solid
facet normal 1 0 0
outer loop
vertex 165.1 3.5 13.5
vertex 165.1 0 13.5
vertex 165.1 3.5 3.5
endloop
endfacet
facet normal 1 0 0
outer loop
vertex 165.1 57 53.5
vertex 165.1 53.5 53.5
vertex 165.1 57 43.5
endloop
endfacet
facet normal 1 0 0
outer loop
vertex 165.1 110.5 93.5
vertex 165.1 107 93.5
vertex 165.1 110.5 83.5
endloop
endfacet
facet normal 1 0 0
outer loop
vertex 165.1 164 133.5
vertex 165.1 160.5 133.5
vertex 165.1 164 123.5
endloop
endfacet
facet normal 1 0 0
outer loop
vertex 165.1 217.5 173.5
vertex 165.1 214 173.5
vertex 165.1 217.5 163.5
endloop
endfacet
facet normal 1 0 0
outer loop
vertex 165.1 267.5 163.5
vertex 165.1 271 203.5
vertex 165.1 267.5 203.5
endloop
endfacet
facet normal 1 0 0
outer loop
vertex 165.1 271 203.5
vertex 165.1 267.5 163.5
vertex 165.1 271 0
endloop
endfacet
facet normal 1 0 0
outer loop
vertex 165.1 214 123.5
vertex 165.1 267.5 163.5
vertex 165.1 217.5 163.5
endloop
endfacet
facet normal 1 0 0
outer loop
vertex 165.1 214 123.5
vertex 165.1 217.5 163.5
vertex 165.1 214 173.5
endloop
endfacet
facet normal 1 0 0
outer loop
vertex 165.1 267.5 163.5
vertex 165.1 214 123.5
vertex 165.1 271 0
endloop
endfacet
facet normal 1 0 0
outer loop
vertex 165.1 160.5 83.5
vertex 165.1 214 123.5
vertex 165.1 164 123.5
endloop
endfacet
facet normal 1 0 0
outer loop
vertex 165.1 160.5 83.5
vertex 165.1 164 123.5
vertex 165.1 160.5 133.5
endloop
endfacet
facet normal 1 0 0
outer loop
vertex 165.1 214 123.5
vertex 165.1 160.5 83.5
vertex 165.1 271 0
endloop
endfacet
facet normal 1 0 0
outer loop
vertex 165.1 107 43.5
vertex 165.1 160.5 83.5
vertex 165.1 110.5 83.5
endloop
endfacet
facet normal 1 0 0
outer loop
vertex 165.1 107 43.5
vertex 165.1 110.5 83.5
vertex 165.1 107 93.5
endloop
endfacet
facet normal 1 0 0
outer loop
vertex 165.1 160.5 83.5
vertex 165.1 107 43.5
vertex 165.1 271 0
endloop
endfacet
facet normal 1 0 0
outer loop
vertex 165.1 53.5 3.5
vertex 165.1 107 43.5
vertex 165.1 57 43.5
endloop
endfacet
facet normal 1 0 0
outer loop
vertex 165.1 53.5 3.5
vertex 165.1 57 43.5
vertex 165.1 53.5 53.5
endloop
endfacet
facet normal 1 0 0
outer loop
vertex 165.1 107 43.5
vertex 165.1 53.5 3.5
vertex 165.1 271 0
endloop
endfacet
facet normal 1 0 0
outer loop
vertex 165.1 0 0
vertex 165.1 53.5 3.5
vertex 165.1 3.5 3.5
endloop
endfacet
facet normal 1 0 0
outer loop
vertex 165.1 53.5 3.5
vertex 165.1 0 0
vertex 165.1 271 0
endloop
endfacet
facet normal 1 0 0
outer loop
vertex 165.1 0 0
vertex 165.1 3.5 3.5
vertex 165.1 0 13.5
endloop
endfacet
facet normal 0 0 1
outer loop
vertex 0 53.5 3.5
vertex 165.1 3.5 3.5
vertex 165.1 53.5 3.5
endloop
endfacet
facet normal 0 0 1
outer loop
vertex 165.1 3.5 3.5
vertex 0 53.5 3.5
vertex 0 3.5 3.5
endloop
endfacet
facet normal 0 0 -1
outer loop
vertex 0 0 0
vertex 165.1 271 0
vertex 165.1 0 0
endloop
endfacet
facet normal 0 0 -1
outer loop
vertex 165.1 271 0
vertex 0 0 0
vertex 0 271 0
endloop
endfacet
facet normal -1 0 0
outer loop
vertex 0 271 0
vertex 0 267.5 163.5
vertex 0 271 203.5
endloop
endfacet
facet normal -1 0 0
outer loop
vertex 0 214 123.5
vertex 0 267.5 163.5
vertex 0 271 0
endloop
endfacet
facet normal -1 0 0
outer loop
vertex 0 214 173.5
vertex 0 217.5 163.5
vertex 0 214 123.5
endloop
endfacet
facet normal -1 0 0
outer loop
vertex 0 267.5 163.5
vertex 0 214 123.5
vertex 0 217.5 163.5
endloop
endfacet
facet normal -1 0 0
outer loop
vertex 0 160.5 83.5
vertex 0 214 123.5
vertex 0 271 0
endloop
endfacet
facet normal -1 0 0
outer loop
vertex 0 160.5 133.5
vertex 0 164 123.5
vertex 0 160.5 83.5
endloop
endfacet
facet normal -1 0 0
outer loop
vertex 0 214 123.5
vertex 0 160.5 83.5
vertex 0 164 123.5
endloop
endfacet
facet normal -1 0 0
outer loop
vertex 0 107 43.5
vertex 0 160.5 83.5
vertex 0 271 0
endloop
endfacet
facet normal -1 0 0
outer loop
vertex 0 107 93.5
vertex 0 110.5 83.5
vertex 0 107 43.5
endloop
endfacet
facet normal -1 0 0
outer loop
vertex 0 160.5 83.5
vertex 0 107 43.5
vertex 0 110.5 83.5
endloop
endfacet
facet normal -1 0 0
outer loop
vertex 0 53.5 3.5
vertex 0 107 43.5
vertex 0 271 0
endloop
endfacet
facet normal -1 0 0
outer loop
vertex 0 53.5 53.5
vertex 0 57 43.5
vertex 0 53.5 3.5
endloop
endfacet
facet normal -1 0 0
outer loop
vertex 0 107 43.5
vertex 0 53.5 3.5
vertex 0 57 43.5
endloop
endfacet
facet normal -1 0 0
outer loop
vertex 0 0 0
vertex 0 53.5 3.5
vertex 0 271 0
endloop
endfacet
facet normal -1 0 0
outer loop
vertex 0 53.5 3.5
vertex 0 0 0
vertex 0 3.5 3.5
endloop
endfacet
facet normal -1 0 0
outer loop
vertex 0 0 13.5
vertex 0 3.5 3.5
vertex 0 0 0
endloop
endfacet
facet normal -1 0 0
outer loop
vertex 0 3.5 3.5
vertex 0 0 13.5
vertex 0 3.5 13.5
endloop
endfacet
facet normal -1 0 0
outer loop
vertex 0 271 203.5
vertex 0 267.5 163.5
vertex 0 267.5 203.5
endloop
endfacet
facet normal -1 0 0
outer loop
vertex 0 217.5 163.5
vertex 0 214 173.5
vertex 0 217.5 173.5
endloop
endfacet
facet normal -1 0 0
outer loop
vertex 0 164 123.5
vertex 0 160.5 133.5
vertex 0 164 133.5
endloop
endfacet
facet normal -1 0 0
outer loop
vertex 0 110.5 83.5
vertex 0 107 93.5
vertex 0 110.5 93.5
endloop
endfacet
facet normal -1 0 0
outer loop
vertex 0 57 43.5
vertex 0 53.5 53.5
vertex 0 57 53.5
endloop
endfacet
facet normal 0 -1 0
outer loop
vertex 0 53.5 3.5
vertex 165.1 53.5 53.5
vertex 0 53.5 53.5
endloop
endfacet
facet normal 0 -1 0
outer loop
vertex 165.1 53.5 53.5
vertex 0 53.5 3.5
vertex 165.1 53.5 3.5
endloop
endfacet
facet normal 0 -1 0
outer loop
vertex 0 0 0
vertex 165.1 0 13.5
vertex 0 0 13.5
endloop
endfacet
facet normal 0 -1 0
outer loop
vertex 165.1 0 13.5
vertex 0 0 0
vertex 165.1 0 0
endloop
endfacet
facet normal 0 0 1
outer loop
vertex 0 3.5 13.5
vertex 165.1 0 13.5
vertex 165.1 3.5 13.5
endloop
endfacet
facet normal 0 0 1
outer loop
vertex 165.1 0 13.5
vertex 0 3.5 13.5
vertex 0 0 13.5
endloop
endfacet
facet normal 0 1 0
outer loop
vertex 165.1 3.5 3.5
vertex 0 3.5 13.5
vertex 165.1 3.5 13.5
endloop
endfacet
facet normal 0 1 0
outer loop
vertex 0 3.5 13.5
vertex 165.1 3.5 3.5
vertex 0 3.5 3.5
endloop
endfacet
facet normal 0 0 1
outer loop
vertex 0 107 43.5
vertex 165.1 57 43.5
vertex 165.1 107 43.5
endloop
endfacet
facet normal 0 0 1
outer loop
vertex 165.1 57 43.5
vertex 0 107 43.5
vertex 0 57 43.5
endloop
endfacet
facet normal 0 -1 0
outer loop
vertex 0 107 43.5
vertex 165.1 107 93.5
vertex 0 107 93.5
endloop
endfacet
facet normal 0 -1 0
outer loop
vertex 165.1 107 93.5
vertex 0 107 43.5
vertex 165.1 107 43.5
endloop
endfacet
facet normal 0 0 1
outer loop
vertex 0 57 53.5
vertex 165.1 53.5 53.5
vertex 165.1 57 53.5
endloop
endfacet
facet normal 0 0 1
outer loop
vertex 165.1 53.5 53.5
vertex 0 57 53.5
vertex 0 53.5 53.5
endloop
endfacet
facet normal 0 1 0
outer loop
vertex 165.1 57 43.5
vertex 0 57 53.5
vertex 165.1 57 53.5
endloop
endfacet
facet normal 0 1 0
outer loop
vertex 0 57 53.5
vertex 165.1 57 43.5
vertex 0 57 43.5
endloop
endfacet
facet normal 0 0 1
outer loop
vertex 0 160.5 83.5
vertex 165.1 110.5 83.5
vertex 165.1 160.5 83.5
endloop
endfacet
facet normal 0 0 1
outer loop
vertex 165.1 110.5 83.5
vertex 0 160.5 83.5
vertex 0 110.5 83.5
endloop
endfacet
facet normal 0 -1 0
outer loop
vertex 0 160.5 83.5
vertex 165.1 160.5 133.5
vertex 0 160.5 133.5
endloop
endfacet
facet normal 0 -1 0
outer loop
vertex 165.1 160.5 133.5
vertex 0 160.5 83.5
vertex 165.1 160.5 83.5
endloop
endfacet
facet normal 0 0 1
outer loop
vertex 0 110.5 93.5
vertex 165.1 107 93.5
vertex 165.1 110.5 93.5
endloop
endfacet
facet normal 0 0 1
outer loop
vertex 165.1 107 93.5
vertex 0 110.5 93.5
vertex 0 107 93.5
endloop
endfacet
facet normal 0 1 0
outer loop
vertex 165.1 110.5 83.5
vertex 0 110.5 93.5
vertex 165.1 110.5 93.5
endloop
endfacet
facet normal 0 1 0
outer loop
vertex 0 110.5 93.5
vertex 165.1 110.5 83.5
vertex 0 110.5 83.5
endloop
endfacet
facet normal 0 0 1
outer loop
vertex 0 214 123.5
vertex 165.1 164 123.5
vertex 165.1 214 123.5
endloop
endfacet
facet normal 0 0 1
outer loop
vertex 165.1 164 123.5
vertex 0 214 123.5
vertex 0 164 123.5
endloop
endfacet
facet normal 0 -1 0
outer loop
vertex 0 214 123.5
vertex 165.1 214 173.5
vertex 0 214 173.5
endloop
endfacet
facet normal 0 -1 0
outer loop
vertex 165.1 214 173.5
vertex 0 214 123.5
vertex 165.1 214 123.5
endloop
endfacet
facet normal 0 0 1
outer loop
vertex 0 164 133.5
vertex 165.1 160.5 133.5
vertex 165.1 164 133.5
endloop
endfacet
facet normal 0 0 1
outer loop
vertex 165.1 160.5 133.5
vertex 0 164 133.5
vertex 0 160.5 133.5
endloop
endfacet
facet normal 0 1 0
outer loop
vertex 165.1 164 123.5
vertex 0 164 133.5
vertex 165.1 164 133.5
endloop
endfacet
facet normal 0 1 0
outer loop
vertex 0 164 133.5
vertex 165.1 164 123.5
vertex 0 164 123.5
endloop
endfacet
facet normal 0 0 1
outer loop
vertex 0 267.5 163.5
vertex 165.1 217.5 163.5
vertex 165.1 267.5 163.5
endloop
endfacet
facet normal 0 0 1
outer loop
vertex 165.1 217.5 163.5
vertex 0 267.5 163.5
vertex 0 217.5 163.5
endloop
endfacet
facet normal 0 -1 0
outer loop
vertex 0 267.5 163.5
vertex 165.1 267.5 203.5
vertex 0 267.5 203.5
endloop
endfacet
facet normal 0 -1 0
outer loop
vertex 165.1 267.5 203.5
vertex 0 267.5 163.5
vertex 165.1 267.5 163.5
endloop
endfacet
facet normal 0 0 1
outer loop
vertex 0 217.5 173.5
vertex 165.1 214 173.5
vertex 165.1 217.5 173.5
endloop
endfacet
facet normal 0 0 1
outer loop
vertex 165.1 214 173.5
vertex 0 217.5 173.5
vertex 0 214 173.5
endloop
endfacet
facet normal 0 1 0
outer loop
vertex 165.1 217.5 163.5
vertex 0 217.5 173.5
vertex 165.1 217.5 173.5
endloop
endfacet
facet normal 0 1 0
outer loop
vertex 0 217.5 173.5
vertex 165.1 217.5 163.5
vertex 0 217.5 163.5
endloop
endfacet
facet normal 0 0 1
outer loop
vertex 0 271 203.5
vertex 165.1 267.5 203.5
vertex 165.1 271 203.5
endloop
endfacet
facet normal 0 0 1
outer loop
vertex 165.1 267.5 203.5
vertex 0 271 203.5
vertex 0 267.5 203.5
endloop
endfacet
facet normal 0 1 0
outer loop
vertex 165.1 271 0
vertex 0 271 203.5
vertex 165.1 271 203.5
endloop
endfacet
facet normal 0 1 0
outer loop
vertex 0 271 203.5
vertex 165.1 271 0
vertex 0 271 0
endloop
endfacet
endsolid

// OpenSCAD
W=6.5*25.4;

step_depth=50;
step_lip=3.5;
step_lip_height=10;
step_height=40;
first_step=3.5;
wall=3.5;

module step(n)
{
    translate([0, n*(step_depth+step_lip), 0])
       union() {
           difference() {
               cube([W, step_depth+step_lip, first_step+n*step_height]);
             //  translate([wall, wall, 0]) cube([W-wall*2, step_depth+step_lip-wall, first_step+n*step_height - wall]);
           }
           cube([W, step_lip, first_step+n*step_height+step_lip_height]);
       };
}

N=5;
for(i=[0:N-1]) step(i);
translate([0, N*(step_depth+step_lip), 0]) cube([W, wall, first_step+N*step_height]);
